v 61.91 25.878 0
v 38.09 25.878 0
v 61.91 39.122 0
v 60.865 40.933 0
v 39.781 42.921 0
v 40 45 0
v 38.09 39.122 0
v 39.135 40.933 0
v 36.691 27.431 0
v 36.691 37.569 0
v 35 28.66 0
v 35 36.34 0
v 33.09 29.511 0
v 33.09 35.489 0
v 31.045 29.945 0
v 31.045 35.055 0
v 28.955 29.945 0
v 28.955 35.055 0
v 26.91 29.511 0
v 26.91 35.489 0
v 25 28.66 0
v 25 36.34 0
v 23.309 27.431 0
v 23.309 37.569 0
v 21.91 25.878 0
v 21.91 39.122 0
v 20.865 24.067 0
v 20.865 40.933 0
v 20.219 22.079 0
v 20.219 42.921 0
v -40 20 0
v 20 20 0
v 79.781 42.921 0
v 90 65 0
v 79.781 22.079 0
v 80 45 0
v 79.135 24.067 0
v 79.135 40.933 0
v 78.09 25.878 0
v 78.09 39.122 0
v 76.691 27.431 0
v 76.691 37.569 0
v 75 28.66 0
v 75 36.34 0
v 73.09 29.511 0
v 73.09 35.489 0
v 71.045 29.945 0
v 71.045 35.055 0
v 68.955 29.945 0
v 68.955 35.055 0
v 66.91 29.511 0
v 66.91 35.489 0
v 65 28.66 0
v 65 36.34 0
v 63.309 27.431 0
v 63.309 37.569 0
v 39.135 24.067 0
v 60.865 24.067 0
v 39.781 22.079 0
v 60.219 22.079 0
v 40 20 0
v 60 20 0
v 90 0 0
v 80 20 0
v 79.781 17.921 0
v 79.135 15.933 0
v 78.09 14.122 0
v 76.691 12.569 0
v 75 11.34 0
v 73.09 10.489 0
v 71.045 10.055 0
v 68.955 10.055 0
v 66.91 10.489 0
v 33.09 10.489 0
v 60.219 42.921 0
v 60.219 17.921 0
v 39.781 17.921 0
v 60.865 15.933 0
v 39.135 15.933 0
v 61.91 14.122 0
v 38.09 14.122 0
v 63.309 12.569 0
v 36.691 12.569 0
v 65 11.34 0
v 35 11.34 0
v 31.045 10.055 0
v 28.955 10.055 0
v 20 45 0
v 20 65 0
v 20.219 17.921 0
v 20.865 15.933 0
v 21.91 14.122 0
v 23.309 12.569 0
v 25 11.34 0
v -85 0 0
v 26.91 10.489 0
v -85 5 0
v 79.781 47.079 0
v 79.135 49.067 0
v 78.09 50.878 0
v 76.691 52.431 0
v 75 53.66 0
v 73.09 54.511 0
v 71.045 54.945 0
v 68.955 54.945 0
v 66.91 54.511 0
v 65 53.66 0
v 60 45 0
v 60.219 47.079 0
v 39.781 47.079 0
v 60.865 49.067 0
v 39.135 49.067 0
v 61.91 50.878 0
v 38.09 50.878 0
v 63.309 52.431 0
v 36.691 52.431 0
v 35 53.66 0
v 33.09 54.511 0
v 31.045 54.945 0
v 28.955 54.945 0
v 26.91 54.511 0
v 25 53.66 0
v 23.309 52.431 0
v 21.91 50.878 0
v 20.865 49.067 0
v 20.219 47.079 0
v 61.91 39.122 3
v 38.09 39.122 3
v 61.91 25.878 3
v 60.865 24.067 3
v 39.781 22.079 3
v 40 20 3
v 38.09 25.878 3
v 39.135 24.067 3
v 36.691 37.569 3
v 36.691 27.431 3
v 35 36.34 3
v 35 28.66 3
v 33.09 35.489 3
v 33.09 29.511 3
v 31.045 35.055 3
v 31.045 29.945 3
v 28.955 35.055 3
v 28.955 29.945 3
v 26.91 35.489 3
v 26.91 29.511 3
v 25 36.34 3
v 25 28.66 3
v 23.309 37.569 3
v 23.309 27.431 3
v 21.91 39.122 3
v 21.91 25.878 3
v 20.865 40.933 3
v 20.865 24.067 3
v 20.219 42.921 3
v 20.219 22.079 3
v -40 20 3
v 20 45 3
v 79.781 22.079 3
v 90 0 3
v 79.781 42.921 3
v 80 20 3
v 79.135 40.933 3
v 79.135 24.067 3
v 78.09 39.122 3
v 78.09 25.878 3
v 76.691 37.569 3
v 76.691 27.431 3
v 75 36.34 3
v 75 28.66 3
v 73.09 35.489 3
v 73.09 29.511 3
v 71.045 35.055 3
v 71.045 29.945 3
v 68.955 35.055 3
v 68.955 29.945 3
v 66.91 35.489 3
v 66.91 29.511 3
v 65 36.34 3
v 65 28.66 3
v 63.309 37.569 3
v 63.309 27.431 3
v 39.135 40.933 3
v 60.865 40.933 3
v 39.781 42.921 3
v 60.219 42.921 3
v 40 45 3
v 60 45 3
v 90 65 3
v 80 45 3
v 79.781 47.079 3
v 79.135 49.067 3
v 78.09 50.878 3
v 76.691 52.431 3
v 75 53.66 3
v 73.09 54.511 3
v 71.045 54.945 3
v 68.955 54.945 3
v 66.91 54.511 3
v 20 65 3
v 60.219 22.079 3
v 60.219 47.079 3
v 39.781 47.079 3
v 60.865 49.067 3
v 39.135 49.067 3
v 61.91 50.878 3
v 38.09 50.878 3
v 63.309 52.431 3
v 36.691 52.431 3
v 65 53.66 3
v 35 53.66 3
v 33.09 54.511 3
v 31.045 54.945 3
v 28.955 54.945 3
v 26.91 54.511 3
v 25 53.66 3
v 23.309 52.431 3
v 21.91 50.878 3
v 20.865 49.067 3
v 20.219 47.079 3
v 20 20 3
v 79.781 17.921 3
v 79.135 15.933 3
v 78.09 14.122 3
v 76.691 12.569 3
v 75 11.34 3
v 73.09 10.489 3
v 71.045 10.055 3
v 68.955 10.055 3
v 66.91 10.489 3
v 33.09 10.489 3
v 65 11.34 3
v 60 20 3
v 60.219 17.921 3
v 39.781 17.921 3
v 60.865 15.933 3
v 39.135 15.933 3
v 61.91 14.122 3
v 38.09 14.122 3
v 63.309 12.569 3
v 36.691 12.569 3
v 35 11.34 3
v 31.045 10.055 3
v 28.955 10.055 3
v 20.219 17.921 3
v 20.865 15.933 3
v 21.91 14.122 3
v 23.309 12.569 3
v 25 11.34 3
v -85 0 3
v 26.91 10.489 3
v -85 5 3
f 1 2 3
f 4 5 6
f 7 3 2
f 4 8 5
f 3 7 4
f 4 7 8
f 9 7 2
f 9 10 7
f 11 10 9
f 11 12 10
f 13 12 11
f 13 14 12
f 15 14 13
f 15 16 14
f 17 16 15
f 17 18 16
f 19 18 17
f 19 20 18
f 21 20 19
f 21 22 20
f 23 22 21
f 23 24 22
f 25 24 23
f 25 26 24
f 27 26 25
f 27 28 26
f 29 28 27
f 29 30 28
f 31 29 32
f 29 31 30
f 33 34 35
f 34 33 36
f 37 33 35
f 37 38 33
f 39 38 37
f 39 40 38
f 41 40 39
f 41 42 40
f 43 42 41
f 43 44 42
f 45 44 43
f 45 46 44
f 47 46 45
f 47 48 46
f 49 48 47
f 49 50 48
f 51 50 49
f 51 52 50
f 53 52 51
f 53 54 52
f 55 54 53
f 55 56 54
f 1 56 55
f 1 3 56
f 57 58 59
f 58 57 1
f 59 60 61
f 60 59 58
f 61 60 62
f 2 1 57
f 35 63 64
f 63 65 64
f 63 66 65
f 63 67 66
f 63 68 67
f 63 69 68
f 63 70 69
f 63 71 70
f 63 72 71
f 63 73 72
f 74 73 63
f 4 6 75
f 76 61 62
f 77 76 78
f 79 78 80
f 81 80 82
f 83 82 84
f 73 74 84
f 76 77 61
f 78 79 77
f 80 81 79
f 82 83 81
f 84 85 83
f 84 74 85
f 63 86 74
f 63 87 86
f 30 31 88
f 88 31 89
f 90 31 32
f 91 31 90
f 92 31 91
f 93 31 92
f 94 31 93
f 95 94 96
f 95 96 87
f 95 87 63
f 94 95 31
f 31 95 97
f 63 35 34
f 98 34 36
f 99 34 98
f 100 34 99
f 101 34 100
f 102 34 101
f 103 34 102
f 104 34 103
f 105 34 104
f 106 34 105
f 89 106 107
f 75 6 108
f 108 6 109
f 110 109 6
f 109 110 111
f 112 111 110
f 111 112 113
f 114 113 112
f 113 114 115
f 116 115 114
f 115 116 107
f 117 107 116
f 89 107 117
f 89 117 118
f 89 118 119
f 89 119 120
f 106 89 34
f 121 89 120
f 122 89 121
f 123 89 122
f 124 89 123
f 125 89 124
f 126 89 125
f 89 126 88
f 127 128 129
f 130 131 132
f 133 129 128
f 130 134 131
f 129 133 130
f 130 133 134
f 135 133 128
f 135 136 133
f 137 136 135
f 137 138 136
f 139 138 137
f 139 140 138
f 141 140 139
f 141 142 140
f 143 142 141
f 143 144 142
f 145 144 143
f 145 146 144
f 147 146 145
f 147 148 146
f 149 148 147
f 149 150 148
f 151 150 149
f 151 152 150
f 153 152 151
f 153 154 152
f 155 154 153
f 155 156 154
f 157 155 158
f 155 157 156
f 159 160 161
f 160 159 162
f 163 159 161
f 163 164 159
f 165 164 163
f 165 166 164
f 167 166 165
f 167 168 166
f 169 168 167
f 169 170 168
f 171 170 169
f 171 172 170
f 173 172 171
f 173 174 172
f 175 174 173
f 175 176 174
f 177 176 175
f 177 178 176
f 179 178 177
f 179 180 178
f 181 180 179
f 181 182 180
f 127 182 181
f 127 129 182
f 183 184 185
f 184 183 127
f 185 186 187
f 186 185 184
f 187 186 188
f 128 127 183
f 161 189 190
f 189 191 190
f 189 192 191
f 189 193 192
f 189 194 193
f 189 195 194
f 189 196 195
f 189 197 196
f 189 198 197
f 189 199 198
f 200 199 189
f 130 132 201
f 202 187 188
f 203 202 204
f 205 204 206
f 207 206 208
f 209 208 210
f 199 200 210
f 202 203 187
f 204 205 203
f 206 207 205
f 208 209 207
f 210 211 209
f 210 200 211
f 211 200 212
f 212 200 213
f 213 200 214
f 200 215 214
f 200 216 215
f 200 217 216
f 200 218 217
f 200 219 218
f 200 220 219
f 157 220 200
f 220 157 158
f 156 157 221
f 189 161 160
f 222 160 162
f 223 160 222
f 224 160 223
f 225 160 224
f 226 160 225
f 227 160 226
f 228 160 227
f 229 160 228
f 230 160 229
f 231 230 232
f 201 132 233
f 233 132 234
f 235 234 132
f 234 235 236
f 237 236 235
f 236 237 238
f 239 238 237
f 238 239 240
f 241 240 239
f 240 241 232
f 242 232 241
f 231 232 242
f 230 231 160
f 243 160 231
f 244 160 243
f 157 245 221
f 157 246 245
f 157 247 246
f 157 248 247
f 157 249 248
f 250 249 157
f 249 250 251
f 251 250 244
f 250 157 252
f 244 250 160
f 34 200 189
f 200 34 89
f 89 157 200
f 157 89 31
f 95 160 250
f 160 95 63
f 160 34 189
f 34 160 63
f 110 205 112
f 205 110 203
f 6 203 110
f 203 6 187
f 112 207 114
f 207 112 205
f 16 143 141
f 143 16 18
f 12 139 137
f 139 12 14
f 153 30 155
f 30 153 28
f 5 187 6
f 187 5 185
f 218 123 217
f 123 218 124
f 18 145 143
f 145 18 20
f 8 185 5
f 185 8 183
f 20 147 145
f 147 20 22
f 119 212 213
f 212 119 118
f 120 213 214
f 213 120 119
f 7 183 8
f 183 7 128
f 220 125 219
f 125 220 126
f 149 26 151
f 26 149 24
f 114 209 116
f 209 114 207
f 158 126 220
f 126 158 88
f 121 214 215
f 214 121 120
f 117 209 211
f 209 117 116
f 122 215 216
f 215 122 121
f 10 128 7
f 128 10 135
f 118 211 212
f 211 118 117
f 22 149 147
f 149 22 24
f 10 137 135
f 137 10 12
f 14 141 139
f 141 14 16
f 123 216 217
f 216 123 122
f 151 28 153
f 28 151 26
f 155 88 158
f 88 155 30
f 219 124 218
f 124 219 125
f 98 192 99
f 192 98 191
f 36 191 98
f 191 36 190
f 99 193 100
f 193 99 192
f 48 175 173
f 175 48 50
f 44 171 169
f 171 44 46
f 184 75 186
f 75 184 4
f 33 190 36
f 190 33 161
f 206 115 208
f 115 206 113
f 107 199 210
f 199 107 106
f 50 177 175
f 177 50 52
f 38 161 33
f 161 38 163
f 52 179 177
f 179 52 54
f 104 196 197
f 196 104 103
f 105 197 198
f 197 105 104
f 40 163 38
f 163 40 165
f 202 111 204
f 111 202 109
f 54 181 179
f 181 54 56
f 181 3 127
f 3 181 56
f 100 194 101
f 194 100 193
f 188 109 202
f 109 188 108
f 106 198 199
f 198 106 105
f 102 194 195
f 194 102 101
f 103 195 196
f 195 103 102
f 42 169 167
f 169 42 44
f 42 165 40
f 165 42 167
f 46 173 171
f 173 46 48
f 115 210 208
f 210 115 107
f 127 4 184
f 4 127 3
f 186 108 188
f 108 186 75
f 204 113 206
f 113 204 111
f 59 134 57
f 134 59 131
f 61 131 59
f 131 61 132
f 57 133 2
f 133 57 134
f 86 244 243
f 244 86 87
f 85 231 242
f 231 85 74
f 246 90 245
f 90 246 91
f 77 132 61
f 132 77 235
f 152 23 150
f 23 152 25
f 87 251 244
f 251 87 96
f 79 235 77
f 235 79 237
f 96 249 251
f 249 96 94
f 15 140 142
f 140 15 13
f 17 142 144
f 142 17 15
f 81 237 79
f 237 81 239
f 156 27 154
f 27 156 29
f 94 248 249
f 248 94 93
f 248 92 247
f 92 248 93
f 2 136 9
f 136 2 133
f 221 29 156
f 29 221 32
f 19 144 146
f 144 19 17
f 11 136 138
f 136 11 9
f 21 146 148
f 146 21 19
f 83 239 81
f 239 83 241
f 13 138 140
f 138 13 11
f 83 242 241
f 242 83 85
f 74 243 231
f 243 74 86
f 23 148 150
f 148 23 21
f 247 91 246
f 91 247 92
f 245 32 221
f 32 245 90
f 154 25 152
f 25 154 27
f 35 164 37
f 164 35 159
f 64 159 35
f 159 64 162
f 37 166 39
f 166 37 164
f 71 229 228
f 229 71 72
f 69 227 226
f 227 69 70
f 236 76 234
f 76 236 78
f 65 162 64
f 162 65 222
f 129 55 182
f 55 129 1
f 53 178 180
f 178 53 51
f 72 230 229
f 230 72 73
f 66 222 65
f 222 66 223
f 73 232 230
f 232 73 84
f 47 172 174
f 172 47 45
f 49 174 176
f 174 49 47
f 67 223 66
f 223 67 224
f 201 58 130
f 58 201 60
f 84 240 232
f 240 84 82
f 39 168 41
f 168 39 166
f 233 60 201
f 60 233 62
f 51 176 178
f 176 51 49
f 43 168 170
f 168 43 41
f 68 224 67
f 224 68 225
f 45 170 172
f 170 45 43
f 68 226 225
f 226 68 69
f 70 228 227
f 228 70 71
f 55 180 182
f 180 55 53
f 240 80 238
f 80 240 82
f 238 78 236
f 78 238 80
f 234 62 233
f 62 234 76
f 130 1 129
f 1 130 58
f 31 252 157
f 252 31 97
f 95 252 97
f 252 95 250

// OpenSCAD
side_thickness = 3;

translate([-85,0,0]) side_front();
side_rear();

module side_front() {
  color("lime")
  linear_extrude(side_thickness)
  polygon([[0,0],[85,0],[85,20],[95,15],[95,35],[85,30],[85,50],[45,20],[0,5]],[[0,1,2,3,4,5,6,7,8]]);
}

module side_rear() {
  color("green")
  difference() {
  linear_extrude(side_thickness)
    polygon([[0,0],[90,0],[90,65],[20,65],[0,50],[0,30],[10,35],[10,15],[0,20]],[[0,1,2,3,4,5,6,7,8]]);
  translate([30, 45, 0])  
    cylinder(r=10, h=side_thickness);
  translate([70, 45, 0])  
    cylinder(r=10, h=side_thickness);
  translate([30, 20, 0])  
    cylinder(r=10, h=side_thickness);
  translate([70, 20, 0])  
    cylinder(r=10, h=side_thickness);
  }
}
